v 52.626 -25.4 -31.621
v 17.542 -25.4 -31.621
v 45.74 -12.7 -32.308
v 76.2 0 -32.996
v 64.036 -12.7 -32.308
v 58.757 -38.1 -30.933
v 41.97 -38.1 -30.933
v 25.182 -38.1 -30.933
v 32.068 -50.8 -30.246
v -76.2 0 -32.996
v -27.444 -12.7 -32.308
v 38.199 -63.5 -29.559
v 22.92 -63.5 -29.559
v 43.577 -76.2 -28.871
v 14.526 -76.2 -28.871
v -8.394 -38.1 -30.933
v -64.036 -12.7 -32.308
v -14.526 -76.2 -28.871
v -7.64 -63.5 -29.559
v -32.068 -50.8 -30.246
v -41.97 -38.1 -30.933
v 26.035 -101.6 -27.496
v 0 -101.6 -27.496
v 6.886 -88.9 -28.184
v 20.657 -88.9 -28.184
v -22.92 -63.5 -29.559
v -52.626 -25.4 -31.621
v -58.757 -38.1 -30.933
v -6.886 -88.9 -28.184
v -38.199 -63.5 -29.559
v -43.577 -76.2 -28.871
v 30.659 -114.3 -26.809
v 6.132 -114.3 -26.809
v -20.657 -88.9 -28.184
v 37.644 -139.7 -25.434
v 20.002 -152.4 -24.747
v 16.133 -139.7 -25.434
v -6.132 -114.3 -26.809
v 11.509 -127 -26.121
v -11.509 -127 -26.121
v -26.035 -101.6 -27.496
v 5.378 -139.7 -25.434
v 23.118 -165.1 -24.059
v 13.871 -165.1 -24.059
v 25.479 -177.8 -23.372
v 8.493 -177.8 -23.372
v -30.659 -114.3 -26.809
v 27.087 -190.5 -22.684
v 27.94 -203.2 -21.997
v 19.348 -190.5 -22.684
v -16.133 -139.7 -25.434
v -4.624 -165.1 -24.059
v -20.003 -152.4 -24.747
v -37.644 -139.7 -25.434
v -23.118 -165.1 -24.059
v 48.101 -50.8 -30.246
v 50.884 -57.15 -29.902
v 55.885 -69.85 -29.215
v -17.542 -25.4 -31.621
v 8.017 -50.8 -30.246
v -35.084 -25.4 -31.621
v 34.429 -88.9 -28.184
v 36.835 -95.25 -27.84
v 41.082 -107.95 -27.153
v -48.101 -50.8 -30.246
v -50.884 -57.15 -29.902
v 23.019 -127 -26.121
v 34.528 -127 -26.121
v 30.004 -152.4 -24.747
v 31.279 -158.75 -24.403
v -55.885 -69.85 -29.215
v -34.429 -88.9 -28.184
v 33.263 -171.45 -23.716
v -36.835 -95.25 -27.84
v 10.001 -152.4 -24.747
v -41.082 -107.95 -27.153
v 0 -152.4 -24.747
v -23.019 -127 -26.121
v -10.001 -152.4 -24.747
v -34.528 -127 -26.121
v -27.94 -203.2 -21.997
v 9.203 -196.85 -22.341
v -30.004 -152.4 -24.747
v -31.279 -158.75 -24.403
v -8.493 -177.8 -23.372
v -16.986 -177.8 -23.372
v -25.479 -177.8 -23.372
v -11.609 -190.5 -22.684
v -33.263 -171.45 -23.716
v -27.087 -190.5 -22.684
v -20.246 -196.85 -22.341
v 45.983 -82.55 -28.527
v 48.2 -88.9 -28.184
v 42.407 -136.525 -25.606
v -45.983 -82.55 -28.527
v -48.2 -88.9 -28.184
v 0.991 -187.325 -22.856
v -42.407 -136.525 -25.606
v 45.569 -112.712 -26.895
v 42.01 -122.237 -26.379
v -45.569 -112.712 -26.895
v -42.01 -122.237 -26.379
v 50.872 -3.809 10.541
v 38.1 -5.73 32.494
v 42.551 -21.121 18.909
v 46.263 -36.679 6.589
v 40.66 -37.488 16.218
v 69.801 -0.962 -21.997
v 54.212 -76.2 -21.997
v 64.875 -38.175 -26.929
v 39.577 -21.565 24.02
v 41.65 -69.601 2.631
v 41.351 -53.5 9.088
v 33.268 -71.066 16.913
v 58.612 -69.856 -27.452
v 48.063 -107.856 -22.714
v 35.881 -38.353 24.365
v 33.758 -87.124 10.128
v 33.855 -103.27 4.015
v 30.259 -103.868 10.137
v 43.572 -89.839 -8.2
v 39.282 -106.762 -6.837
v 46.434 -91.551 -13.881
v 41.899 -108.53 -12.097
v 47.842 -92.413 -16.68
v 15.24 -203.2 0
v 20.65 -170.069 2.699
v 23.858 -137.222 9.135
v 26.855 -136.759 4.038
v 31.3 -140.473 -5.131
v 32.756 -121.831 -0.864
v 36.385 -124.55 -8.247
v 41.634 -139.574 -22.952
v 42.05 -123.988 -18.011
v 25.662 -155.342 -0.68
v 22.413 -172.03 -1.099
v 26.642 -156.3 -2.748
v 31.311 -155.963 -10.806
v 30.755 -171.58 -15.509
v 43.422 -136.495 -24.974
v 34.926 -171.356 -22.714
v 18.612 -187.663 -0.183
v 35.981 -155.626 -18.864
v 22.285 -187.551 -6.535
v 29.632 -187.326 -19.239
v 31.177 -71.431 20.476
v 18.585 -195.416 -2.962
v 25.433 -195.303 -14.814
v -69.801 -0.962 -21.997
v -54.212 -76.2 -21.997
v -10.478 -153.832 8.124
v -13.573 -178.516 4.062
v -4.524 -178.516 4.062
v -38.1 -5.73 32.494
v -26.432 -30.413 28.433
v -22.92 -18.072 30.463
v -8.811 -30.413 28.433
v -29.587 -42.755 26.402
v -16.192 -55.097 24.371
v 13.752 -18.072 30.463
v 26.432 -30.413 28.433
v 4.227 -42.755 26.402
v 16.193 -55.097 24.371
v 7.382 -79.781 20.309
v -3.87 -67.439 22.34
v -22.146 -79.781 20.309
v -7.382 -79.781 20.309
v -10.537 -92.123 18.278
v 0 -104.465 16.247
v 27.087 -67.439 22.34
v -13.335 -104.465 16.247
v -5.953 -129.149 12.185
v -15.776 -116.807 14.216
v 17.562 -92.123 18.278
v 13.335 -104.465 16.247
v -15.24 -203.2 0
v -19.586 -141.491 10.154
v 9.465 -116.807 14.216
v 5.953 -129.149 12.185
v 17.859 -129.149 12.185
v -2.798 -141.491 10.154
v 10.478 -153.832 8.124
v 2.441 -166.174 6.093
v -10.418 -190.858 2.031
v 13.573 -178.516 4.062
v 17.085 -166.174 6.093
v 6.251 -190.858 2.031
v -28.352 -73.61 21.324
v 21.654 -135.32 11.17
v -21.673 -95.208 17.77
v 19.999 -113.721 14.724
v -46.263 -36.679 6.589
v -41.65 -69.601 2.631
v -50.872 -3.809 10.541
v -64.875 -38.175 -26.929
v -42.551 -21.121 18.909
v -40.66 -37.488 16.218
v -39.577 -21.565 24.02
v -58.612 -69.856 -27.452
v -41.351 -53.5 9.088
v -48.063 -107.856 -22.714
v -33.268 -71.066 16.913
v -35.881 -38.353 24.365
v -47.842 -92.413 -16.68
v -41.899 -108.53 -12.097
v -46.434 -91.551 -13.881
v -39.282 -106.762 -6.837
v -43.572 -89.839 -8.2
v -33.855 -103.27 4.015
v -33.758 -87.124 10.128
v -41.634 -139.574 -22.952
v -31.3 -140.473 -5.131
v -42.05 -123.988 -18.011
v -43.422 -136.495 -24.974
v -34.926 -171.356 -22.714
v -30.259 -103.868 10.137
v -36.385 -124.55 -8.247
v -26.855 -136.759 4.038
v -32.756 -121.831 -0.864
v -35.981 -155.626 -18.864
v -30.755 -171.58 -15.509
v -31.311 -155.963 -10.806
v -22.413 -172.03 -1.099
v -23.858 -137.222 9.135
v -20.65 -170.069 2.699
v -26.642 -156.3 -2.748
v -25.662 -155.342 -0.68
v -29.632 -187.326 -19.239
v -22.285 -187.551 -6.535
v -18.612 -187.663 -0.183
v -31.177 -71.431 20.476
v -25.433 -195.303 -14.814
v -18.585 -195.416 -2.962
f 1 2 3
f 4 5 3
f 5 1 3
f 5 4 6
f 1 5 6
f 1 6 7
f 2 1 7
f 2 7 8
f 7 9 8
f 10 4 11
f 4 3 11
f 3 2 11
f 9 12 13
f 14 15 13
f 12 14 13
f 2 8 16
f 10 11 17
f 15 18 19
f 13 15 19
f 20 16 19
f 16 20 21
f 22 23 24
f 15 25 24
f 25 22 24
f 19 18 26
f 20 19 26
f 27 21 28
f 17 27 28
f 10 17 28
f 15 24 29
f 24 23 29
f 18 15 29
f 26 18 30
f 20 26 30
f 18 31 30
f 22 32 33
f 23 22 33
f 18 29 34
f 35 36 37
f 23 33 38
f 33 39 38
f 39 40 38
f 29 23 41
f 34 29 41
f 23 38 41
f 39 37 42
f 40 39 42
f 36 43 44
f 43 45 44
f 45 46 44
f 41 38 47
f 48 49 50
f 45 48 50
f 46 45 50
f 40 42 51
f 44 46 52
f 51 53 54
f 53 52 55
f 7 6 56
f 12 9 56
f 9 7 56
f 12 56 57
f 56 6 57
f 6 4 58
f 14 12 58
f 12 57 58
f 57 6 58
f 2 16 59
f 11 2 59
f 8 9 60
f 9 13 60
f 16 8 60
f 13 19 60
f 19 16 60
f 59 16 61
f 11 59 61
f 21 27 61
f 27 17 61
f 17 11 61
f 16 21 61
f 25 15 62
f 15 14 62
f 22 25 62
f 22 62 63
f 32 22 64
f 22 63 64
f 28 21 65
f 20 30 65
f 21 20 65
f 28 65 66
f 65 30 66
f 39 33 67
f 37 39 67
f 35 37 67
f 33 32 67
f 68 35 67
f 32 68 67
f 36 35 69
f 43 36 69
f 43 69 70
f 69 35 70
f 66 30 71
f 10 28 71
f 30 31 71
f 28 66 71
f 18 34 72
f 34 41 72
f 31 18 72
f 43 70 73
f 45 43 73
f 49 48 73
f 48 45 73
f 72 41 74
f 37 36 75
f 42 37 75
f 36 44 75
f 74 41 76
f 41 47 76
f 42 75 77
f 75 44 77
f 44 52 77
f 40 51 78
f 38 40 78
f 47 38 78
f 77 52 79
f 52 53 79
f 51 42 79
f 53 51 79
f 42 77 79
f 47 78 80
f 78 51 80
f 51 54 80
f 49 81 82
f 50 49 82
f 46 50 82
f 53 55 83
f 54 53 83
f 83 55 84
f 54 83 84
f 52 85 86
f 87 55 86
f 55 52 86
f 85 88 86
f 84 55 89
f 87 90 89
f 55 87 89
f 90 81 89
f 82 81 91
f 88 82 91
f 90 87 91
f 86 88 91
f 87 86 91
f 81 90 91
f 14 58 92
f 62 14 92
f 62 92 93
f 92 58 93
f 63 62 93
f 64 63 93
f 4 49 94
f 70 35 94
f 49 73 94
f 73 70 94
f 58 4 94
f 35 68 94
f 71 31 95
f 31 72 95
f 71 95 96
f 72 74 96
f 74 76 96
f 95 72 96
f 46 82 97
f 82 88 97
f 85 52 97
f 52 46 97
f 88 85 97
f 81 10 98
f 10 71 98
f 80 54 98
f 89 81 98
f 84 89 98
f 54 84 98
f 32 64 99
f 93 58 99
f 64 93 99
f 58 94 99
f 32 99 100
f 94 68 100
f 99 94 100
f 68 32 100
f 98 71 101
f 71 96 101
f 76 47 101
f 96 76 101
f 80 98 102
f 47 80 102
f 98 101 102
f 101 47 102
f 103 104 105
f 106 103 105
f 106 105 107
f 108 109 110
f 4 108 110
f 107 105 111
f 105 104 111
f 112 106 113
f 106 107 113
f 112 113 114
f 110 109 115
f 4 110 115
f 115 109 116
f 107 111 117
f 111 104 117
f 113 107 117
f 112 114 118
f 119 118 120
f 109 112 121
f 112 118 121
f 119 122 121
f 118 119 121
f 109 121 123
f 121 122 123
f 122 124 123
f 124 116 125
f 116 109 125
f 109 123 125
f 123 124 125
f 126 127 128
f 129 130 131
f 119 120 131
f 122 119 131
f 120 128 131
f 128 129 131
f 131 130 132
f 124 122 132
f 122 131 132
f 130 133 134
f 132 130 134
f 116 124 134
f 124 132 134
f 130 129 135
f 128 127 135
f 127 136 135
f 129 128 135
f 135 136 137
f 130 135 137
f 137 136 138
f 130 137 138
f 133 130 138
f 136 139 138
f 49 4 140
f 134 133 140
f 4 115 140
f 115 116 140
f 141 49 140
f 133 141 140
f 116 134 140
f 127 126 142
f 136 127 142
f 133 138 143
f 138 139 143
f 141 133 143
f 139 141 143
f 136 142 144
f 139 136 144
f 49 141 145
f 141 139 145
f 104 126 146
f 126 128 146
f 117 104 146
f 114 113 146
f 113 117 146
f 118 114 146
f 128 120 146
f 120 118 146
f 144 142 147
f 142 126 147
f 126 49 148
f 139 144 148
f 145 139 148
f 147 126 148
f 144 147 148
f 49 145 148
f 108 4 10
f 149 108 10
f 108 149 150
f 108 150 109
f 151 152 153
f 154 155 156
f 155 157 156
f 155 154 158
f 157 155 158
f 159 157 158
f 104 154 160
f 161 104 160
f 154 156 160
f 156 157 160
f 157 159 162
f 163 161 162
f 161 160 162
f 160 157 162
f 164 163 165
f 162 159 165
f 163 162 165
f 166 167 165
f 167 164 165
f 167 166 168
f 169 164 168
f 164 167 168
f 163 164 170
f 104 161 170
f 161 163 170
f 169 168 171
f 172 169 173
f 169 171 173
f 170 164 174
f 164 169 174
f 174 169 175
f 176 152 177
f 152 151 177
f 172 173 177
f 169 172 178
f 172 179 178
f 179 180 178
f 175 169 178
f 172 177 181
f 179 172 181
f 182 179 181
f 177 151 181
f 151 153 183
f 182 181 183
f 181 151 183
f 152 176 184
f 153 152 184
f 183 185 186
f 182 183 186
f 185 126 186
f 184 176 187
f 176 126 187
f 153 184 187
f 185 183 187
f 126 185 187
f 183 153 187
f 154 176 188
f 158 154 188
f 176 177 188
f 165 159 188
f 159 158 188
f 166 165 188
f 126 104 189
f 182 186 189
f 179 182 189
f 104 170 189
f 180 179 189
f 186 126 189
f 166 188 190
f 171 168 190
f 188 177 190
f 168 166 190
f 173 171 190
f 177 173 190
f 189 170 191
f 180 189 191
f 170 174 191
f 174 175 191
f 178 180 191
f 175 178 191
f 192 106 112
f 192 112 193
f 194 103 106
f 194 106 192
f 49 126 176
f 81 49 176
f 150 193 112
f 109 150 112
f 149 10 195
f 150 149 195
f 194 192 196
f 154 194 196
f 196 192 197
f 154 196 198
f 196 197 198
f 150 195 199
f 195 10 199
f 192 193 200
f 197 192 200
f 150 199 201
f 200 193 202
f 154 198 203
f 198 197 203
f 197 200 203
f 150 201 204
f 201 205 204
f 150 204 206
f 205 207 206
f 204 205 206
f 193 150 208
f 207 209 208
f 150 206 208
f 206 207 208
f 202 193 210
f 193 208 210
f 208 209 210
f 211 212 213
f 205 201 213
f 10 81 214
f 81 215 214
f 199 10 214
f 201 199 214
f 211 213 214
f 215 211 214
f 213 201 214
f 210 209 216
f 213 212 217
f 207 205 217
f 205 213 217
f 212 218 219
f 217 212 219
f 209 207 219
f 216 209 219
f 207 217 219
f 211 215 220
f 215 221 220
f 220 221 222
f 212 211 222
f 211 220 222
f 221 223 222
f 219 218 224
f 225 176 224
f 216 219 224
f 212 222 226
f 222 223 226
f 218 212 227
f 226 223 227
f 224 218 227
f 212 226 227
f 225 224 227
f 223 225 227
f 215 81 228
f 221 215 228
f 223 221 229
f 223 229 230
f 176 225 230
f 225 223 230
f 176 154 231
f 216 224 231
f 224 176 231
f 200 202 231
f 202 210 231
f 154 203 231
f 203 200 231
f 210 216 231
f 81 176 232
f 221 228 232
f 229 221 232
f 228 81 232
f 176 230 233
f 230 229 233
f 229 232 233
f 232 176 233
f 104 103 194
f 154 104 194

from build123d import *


with BuildPart() as f6:
    # F5 (on face) → F6 section 0
    with BuildSketch(Plane(origin=(0, -2.86481, -0.250638), x_dir=(-1, 0, 0), z_dir=(0, 0.996195, 0.087156))):
        Polygon((-38.1, 32.87001), (-76.2, -32.87001), (76.2, -32.87001), (38.1, 32.87001), align=None)
    # F2 (on offset) → F6 section 1
    with BuildSketch(Plane.XZ.offset(203.2)):
        Polygon((-15.24, 0), (-27.94, -21.997045), (27.94, -21.997045), (15.24, 0), align=None)
    loft()

    # F10 (on face) → F11 section 0
    with BuildSketch(Plane(origin=(0, -65.596307, 17.576477), x_dir=(1, 0, 0), z_dir=(0, -0.965926, 0.258819))):
        Polygon((-76.2, -40.969525), (76.2, -40.969525), (60.96, -15.472508), (-60.96, -15.472508), align=None)
    # F3 (on Front) → F11 section 1
    with BuildSketch(Plane.XZ):
        Polygon((76.2, -21.997045), (57.15, 10.998523), (-57.15, 10.998523), (-76.2, -21.997045), align=None)
    loft(mode=Mode.SUBTRACT)


solid = f6.part
